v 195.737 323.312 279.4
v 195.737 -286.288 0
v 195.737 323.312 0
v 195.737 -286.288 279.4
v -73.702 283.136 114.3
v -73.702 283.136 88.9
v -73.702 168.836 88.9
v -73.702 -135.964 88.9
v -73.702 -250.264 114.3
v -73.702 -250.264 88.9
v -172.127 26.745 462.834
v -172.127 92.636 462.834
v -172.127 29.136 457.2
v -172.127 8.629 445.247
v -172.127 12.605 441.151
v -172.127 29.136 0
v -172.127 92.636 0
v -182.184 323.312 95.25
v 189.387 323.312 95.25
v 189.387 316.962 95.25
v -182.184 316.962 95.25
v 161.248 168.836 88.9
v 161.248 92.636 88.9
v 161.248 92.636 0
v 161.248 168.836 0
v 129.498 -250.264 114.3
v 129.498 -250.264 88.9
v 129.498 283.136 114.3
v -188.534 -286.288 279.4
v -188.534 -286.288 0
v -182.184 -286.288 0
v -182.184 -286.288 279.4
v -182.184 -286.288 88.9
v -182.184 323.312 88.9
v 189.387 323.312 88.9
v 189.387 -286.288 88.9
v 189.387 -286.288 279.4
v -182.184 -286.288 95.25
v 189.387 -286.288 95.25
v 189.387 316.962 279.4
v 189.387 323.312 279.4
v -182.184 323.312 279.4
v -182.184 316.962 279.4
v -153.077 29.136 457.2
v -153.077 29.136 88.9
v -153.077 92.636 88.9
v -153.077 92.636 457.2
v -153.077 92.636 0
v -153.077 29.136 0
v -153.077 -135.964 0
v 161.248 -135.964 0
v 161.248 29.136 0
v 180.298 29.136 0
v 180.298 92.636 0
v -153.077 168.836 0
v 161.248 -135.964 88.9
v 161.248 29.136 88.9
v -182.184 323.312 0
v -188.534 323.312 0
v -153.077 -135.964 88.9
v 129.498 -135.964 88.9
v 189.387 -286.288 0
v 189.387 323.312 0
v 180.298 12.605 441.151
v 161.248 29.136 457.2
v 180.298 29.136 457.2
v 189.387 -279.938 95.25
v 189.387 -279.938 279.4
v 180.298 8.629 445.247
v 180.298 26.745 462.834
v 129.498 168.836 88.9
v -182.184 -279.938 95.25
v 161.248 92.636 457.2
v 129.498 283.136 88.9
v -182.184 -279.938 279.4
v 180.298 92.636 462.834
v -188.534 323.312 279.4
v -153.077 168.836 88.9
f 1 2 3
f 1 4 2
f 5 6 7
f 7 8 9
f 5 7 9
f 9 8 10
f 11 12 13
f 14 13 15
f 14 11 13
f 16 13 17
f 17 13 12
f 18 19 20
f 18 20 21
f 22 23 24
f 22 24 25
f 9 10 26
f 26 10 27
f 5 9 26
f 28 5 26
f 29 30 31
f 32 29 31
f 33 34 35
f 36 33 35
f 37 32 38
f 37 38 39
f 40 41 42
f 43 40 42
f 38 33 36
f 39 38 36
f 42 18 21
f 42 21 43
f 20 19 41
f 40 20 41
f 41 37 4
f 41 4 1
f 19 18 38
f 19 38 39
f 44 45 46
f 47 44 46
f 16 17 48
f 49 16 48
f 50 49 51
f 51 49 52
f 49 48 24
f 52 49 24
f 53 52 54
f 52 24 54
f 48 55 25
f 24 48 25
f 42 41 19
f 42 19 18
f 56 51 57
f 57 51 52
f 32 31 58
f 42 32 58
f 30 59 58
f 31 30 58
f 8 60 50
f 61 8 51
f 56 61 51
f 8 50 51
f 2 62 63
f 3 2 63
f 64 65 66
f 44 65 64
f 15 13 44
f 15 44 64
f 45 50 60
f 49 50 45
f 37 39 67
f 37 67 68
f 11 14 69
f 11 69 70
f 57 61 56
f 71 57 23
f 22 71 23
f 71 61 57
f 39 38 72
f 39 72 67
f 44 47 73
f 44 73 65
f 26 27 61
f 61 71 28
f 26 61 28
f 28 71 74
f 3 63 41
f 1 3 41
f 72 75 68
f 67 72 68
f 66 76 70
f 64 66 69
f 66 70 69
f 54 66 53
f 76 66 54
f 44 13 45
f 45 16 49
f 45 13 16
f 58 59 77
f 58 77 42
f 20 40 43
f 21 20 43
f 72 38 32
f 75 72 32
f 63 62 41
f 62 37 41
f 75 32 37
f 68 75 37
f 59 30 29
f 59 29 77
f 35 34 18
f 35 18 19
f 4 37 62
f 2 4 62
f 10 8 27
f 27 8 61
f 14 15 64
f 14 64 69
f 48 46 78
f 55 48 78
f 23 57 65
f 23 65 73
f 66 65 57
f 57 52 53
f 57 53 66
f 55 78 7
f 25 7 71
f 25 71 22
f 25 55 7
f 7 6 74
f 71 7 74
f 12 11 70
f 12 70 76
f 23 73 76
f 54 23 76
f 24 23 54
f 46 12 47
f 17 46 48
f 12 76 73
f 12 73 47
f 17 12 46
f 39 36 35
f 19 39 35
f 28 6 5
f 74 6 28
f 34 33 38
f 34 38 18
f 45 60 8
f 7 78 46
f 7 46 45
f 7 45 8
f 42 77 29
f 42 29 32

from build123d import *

# Parameters (mm, degrees)
F0_W      = 314.325
F0_H      = 304.8
F1_DEPTH  = 88.9
F2_W      = 203.2
F2_H      = 114.3
F2_H_2    = 304.8
F3_DEPTH  = 25.4
F4_W      = 19.05
F4_H      = 63.5
F5_DEPTH  = 457.2
F7_DEPTH  = 352.425
F8_W      = 6.35
F8_H      = 609.6
F9_DEPTH  = 279.4
F10_W     = 371.5708255768
F10_H     = 609.6
F11_DEPTH = 6.35
F12_W     = 371.5708255768
F12_H     = 184.15
F13_DEPTH = 6.35
F14_W     = 609.6
F14_H     = 88.9
F14_H_2   = 6.35
F14_H_3   = 184.15
F15_DEPTH = 6.35
F16_W     = 371.5708255768
F16_H     = 184.15
F17_DEPTH = 6.35


with BuildPart() as f1:
    # F0 (on Top) → F1 (new body)
    with BuildSketch(Plane.XY):
        with Locations((4.0858834982, 16.4359185861)):
            Rectangle(F0_W, F0_H)
    extrude(amount=F1_DEPTH)

    # F2 (on face) → F3 (join)
    with BuildSketch(Plane.XY.offset(88.9)):
        with Locations((27.8983834982, 225.9859185861)):
            Rectangle(F2_W, F2_H)
        with Locations((27.8983834982, 16.4359185861)):
            Rectangle(F2_W, F2_H_2)
        with Locations((27.8983834982, -193.1140814139)):
            Rectangle(F2_W, F2_H)
    extrude(amount=F3_DEPTH)

    # F4 (on Top) → F5 (join)
    with BuildSketch(Plane.XY):
        with Locations((-162.6016165018, 60.8859185861)):
            Rectangle(F4_W, F4_H)
        with Locations((170.7733834982, 60.8859185861)):
            Rectangle(F4_W, F4_H)
    extrude(amount=F5_DEPTH)

    # F6 (on face) → F7 (join)
    with BuildSketch(Plane(origin=(-172.1266165018, 0, 0), x_dir=(0, -1, 0), z_dir=(-1, 0, 0))):
        Polygon((-92.6359185861, 462.8342034762), (-92.6359185861, 457.2), (-29.1359185861, 457.2), (-12.6053467393, 441.1513507366), (-8.629405934, 445.2466844972), (-26.745057994, 462.8342034762), align=None)
    extrude(amount=-F7_DEPTH)


with BuildPart() as f9:
    # F8 (on Top) → F9 (new body)
    with BuildSketch(Plane.XY):
        with Locations((-185.3590703487, 18.511977005)):
            Rectangle(F8_W, F8_H)
    extrude(amount=F9_DEPTH)


with BuildPart() as f11:
    # F10 (on face) → F11 (new body)
    with BuildSketch(Plane.XY.offset(88.9)):
        with Locations((3.6013424397, 18.511977005)):
            Rectangle(F10_W, F10_H)
        Polygon((-73.7016165018, 168.8359185861), (-73.7016165018, -135.9640814139), (-153.0766165018, -135.9640814139), (-153.0766165018, 29.1359185861), (-153.0766165018, 92.6359185861), (-153.0766165018, 168.8359185861), align=None, mode=Mode.SUBTRACT)
        Polygon((-153.0766165018, -135.9640814139), (-73.7016165018, -135.9640814139), (-73.7016165018, 168.8359185861), (-153.0766165018, 168.8359185861), (-153.0766165018, 92.6359185861), (-153.0766165018, 29.1359185861), align=None)
    extrude(amount=F11_DEPTH)


with BuildPart() as f13:
    # F12 (on face) → F13 (new body)
    with BuildSketch(Plane.XZ.offset(286.288022995)):
        with Locations((3.6013424397, 187.325)):
            Rectangle(F12_W, F12_H)
    extrude(amount=-F13_DEPTH)


with BuildPart() as f15:
    # F14 (on face) → F15 (new body)
    with BuildSketch(Plane.YZ.offset(189.386755228)):
        with Locations((18.511977005, 44.45)):
            Rectangle(F14_W, F14_H)
        with Locations((18.511977005, 92.075)):
            Rectangle(F14_W, F14_H_2)
        with Locations((18.511977005, 187.325)):
            Rectangle(F14_W, F14_H_3)
    extrude(amount=F15_DEPTH)


with BuildPart() as f17:
    # F16 (on face) → F17 (new body)
    with BuildSketch(Plane(origin=(0, 323.311977005, 0), x_dir=(-1, 0, 0), z_dir=(0, 1, 0))):
        with Locations((-3.6013424397, 187.325)):
            Rectangle(F16_W, F16_H)
    extrude(amount=-F17_DEPTH)


solid = Compound([f1.part, f9.part, f11.part, f13.part, f15.part, f17.part])
